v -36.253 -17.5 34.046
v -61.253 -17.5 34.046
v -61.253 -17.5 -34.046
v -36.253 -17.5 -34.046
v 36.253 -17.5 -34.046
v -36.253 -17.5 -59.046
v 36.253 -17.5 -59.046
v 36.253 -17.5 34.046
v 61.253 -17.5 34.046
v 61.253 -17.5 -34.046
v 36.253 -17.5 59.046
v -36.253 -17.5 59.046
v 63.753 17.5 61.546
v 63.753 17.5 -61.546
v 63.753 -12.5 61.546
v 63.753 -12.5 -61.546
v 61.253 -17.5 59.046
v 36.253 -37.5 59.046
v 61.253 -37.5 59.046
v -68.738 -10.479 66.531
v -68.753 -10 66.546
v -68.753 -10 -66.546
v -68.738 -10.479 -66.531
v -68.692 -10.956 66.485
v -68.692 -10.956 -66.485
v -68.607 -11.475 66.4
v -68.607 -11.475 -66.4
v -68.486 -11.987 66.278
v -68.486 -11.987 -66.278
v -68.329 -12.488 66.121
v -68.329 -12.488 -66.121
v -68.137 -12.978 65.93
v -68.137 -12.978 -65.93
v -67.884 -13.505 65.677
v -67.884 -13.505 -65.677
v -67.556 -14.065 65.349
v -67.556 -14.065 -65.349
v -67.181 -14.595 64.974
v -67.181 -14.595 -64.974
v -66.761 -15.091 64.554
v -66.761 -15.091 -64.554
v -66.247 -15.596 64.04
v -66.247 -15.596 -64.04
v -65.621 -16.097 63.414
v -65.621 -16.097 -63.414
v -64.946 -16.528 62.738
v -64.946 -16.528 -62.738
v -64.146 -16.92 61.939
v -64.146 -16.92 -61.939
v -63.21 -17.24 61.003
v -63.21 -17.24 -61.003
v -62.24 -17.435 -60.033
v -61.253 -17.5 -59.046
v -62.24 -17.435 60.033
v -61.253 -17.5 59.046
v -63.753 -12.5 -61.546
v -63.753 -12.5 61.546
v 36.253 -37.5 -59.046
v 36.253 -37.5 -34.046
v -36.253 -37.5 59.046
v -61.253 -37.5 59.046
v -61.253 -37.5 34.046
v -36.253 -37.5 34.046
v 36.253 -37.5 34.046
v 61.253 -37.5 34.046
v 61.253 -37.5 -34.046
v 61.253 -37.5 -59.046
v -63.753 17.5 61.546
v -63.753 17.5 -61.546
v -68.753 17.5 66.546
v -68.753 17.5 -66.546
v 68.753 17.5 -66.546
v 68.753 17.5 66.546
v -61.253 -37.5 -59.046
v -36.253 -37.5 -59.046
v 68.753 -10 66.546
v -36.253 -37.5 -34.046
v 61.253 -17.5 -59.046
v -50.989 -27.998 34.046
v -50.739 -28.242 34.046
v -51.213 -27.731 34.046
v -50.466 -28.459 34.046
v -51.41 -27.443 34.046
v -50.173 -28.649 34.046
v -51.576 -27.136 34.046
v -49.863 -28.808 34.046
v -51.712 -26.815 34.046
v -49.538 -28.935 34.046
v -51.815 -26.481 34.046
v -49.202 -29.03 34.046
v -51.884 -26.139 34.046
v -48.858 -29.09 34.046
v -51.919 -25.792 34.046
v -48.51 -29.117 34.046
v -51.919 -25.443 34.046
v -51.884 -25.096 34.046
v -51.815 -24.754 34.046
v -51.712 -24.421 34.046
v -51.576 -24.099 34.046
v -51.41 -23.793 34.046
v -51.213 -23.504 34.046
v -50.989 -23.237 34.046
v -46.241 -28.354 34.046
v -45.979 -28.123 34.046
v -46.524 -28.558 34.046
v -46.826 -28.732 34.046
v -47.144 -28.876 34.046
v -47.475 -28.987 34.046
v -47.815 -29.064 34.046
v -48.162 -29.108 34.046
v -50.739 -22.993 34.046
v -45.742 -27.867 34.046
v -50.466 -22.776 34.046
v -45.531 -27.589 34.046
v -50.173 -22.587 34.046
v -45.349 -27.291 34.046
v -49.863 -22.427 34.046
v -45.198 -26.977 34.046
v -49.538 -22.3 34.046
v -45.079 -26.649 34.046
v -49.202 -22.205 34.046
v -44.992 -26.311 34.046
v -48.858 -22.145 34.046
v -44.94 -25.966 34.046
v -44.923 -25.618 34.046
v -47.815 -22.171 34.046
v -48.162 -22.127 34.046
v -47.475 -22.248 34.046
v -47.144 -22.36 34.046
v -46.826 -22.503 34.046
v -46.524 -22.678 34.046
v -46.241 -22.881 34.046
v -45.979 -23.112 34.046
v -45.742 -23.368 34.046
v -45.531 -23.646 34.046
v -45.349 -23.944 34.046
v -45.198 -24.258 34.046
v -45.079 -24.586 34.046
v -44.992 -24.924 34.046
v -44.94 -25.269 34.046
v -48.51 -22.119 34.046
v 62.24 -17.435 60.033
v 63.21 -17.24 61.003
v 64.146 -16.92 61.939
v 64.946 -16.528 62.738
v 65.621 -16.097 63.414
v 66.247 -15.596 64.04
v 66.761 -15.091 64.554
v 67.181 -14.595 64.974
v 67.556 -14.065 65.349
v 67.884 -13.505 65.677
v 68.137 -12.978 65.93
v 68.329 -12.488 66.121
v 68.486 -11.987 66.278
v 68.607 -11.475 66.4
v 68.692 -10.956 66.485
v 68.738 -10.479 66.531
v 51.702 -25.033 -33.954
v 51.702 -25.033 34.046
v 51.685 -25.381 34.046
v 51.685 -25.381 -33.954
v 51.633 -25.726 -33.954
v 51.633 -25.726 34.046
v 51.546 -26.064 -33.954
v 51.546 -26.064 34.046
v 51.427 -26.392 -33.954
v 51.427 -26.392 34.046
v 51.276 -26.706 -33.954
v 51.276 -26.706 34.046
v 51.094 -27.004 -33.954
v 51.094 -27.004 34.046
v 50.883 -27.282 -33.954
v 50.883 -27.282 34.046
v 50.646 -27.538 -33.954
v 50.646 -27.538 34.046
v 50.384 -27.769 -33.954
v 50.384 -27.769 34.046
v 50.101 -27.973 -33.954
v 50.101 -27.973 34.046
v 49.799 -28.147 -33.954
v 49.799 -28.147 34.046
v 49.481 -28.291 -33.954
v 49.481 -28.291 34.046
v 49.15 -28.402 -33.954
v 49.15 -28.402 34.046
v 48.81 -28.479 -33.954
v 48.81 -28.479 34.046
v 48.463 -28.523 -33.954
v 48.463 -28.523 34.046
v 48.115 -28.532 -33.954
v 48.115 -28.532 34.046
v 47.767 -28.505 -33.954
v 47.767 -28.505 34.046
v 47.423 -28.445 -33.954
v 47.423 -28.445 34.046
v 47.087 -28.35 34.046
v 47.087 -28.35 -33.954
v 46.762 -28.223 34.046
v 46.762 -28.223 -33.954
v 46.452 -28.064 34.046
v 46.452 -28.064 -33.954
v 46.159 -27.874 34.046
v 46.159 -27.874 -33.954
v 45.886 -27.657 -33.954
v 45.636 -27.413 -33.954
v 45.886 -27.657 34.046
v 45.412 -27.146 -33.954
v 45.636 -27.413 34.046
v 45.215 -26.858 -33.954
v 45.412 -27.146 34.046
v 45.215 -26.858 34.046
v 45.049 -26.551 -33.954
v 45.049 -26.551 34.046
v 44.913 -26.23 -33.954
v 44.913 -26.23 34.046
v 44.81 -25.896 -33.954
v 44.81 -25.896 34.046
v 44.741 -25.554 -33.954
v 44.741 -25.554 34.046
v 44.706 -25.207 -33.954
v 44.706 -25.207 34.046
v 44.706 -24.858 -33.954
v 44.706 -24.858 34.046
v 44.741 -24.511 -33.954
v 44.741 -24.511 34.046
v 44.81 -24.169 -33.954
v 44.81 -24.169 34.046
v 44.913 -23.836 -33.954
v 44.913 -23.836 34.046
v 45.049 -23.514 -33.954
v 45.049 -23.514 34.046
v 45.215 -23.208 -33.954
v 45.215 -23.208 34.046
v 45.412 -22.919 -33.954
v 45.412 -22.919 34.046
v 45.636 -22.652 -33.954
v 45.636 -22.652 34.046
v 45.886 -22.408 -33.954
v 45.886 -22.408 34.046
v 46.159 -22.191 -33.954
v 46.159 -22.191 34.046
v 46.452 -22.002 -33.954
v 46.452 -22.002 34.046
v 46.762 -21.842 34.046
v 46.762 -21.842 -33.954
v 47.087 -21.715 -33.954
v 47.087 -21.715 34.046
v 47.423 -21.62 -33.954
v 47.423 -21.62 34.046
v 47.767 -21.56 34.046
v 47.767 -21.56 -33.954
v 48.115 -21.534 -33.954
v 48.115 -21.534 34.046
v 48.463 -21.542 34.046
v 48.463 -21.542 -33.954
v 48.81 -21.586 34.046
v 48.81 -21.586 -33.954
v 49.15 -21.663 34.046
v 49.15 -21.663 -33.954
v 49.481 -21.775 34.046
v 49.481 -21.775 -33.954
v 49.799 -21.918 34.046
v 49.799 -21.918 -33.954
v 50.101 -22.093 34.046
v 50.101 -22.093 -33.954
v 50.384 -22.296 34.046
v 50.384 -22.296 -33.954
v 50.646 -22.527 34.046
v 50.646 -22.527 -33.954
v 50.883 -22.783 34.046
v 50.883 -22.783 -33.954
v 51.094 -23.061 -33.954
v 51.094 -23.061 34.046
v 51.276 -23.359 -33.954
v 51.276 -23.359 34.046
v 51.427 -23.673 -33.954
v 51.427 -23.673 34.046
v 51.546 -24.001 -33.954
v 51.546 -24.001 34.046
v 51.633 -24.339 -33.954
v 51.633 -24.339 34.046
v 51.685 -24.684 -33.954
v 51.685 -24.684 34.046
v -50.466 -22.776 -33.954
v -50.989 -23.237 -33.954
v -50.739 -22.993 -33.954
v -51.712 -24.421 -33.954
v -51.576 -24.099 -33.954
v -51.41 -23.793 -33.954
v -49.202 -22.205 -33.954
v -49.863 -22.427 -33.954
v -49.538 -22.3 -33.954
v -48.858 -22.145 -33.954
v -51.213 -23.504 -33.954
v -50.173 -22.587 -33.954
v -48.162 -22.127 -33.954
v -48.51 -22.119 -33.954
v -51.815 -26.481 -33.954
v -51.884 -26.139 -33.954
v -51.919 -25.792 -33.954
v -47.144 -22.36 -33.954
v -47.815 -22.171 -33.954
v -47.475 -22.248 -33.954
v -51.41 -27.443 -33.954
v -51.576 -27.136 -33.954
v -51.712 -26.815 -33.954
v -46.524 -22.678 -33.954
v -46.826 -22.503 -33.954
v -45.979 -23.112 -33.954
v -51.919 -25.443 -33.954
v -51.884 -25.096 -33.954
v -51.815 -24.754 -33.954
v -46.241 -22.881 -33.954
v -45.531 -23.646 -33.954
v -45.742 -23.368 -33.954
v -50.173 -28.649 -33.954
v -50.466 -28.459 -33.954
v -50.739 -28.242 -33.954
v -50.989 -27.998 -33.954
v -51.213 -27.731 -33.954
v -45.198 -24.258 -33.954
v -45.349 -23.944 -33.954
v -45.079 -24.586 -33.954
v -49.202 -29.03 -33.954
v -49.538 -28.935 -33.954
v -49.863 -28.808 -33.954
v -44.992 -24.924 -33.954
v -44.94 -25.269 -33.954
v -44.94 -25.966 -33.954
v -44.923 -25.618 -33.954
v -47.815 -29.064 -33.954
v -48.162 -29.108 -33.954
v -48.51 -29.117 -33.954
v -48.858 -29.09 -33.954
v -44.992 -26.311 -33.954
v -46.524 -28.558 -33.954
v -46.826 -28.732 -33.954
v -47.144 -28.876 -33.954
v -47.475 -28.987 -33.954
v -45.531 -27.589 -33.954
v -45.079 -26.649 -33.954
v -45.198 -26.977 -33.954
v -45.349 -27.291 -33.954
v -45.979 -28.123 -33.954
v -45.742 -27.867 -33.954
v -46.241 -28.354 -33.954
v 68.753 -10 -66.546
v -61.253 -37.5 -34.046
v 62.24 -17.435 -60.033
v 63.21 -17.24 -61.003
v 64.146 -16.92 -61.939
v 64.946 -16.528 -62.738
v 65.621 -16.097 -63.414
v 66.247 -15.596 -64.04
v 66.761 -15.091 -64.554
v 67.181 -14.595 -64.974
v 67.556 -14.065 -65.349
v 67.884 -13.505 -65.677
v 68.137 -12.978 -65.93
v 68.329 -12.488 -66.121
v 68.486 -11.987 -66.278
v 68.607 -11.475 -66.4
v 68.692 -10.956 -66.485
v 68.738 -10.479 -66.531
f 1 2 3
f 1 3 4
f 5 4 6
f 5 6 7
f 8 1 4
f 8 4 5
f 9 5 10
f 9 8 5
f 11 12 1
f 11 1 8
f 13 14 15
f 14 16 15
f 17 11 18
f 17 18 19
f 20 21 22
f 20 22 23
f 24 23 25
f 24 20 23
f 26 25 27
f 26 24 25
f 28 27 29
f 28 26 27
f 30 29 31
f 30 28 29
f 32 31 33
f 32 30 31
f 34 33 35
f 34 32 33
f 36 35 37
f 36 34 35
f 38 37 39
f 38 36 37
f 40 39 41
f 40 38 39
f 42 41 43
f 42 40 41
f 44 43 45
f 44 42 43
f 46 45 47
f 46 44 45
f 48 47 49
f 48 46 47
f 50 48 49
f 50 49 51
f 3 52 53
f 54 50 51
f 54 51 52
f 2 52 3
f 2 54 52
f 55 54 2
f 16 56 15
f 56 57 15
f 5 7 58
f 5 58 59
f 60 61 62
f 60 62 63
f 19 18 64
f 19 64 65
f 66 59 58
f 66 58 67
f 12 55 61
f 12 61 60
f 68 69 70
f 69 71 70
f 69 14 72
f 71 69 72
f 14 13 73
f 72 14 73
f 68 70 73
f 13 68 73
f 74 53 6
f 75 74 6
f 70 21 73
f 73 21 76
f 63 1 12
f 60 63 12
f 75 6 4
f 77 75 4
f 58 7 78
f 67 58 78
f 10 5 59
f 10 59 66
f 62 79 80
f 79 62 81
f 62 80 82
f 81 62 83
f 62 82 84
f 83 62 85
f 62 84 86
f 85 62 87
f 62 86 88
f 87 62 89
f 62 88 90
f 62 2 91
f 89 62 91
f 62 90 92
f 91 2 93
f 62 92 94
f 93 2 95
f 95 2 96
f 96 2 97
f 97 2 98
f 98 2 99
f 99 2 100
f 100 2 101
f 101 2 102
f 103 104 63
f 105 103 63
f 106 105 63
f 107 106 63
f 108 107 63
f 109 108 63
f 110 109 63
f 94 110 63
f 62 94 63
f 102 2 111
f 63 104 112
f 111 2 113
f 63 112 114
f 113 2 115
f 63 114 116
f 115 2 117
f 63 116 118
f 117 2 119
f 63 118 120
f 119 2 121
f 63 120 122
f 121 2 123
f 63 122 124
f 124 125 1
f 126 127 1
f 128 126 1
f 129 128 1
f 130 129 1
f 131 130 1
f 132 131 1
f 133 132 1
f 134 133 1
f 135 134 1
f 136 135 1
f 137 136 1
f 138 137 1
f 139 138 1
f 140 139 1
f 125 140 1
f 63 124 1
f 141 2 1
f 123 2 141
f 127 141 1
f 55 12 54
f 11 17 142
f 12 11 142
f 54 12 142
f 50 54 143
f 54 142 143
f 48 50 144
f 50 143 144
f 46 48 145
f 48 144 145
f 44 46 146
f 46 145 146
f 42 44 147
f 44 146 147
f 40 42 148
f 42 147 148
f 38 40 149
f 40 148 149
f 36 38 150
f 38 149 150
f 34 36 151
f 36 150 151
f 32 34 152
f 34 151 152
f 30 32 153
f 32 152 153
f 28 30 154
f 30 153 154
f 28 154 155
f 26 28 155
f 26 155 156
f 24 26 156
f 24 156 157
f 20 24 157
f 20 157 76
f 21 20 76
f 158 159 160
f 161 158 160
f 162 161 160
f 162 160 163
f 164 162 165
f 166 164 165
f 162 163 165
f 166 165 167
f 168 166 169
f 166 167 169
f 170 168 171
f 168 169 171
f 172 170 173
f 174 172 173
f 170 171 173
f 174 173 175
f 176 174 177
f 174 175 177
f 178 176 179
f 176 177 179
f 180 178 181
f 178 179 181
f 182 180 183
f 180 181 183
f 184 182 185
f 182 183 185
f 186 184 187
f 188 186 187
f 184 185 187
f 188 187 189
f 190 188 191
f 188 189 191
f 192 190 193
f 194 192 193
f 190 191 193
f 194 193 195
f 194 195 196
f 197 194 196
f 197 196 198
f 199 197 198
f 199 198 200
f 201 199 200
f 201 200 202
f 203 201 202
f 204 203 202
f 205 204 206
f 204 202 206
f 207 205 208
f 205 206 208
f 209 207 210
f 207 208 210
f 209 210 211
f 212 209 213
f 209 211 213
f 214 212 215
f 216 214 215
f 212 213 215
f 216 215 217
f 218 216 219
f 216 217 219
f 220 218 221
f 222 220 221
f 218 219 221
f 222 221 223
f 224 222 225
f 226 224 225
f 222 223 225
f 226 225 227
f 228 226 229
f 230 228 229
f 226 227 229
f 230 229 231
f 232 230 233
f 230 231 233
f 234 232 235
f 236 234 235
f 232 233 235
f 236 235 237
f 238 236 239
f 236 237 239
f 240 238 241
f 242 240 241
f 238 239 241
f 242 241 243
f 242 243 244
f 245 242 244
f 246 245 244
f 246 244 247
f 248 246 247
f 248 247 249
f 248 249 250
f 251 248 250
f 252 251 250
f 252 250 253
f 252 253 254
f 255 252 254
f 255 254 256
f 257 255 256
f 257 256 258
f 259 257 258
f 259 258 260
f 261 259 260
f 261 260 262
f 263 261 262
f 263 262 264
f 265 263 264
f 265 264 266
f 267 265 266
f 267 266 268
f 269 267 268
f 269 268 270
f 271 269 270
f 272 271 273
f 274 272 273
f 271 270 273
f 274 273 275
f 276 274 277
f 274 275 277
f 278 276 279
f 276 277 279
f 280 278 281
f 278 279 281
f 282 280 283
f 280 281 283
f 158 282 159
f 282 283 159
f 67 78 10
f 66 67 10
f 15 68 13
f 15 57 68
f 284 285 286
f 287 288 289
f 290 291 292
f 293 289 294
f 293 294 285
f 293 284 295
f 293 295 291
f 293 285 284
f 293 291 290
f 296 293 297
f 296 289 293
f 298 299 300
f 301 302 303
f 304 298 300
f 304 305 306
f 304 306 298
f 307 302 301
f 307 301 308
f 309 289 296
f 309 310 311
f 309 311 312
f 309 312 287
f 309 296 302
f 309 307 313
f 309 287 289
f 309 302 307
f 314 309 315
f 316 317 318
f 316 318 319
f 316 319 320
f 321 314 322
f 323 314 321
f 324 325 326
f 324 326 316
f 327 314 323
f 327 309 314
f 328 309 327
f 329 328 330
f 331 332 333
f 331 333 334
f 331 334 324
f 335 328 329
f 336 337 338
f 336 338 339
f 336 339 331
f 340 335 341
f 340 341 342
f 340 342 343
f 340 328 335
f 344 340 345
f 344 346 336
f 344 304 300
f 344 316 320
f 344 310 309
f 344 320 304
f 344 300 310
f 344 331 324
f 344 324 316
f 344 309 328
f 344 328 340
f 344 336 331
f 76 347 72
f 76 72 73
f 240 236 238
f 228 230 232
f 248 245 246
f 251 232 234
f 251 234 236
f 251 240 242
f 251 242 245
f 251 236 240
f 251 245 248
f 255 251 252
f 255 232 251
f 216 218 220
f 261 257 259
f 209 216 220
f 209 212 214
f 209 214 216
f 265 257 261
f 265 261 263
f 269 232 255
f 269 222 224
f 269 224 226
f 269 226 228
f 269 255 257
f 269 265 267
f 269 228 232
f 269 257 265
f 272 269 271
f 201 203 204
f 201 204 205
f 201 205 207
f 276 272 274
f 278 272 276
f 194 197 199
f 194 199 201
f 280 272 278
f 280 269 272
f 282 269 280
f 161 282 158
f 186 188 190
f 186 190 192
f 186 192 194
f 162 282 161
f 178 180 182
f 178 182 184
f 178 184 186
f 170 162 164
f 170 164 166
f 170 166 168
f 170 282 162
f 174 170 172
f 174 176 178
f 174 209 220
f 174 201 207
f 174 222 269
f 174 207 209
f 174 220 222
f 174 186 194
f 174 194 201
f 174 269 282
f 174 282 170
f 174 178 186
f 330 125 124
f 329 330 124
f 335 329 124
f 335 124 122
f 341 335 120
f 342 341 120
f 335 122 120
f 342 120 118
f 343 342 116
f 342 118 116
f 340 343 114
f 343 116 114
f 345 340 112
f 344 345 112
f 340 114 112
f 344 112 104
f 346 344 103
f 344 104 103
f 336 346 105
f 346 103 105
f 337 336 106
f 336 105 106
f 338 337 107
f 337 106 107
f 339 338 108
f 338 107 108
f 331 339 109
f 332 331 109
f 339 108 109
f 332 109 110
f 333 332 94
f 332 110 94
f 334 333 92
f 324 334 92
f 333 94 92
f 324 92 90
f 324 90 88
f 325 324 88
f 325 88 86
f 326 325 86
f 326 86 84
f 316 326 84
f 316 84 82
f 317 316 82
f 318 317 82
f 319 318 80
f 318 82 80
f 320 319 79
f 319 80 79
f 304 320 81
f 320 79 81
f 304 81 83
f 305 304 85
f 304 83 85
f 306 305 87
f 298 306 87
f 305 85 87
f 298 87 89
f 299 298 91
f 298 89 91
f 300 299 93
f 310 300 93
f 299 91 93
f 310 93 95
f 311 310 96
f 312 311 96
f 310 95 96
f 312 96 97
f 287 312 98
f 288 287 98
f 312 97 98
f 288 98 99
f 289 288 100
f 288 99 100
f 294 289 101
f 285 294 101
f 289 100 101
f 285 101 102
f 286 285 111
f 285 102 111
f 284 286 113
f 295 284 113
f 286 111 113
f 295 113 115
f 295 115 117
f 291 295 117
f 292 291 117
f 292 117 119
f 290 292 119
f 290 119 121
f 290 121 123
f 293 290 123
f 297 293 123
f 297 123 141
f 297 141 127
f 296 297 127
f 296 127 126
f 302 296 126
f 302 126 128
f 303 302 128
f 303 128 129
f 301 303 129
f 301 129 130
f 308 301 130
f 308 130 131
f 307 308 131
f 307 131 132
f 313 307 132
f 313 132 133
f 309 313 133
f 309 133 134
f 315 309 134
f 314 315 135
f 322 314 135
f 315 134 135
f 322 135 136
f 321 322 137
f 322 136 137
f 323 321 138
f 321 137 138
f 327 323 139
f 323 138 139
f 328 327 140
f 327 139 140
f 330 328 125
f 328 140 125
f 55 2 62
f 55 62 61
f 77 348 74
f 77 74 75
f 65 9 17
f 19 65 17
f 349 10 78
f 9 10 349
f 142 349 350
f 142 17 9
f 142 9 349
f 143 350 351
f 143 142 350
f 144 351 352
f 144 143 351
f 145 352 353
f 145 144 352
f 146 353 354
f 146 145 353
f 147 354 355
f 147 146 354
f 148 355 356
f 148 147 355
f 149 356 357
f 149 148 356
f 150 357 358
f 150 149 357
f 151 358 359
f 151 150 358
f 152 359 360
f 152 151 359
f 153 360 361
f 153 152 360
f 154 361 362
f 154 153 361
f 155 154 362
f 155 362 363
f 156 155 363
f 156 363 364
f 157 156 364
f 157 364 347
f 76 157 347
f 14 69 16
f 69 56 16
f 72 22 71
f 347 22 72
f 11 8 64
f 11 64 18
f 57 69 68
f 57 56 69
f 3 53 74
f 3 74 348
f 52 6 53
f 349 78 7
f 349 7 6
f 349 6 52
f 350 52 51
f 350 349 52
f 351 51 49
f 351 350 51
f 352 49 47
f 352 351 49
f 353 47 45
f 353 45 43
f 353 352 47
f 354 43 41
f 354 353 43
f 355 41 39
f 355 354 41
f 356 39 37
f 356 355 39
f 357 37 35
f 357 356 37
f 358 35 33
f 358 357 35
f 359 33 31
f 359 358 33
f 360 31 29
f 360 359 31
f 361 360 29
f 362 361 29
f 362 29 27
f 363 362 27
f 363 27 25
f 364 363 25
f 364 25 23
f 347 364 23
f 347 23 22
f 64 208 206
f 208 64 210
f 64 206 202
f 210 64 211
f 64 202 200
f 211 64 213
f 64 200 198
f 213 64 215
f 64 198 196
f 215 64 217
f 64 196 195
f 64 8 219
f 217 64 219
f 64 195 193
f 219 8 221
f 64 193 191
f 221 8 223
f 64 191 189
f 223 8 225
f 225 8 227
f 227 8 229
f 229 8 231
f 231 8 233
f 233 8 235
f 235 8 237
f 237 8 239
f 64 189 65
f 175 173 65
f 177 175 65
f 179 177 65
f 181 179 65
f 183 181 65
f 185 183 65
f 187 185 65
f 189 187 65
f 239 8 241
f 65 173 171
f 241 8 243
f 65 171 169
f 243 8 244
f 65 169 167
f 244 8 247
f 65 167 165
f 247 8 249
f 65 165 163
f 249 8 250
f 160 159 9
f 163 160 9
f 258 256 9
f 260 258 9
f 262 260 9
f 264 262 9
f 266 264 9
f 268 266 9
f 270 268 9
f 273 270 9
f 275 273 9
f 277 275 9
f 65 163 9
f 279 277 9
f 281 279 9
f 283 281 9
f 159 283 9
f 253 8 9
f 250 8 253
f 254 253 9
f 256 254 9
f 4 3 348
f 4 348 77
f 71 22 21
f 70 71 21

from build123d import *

# Parameters (mm, degrees)
F0_W      = 137.506828
F0_H      = 133.092508
F1_DEPTH  = 17.5
F2_T      = -5
F3_R      = 7.5
F4_W      = 25
F4_H      = 25
F5_DEPTH  = 20
F6_W      = 25
F6_H      = 25
F7_DEPTH  = 20
F8_W      = 25
F8_H      = 25
F9_DEPTH  = 20
F10_W     = 25
F10_H     = 25
F11_DEPTH = 20
F12_R     = 3.5
F13_DEPTH = 68
F14_R     = 3.5
F15_DEPTH = 68


with BuildPart() as f1:
    # F0 (on Front) → F1 (new body, symmetric)
    with BuildSketch(Plane.XZ):
        Rectangle(F0_W, F0_H)
    extrude(amount=F1_DEPTH, both=True)

    # F2
    f2_openings = [f1.faces().sort_by_distance(p)[0] for p in [
        (0, 17.5, 0),
    ]]
    offset(amount=F2_T, openings=f2_openings)

    # F3
    f3_edges = [f1.edges().sort_by_distance(p)[0] for p in [
        (0, -17.5, -66.546254),
        (68.753414, -17.5, 0),
        (0, -17.5, 66.546254),
        (-68.753414, -17.5, 0),
    ]]
    fillet(f3_edges, radius=F3_R)

    # F4 (on face) → F5 (join)
    with BuildSketch(Plane.XZ.offset(17.5)):
        with Locations((-48.753414, 46.546254)):
            Rectangle(F4_W, F4_H)
    extrude(amount=F5_DEPTH)

    # F6 (on face) → F7 (join)
    with BuildSketch(Plane.XZ.offset(17.5)):
        with Locations((48.753414, 46.546254)):
            Rectangle(F6_W, F6_H)
    extrude(amount=F7_DEPTH)

    # F8 (on face) → F9 (join)
    with BuildSketch(Plane.XZ.offset(17.5)):
        with Locations((-48.753414, -46.546254)):
            Rectangle(F8_W, F8_H)
    extrude(amount=F9_DEPTH)

    # F10 (on face) → F11 (join)
    with BuildSketch(Plane.XZ.offset(17.5)):
        with Locations((48.753414, -46.546254)):
            Rectangle(F10_W, F10_H)
    extrude(amount=F11_DEPTH)

    # F12 (on face) → F13 (join)
    with BuildSketch(Plane(origin=(0, 0, 34.046254), x_dir=(1, 0, 0), z_dir=(0, 0, -1))):
        with Locations((-48.423063, 25.617592)):
            Circle(F12_R)
    extrude(amount=F13_DEPTH)

    # F14 (on face) → F15 (join)
    with BuildSketch(Plane(origin=(0, 0, 34.046254), x_dir=(1, 0, 0), z_dir=(0, 0, -1))):
        with Locations((48.201937, 25.032593)):
            Circle(F14_R)
    extrude(amount=F15_DEPTH)


solid = f1.part
